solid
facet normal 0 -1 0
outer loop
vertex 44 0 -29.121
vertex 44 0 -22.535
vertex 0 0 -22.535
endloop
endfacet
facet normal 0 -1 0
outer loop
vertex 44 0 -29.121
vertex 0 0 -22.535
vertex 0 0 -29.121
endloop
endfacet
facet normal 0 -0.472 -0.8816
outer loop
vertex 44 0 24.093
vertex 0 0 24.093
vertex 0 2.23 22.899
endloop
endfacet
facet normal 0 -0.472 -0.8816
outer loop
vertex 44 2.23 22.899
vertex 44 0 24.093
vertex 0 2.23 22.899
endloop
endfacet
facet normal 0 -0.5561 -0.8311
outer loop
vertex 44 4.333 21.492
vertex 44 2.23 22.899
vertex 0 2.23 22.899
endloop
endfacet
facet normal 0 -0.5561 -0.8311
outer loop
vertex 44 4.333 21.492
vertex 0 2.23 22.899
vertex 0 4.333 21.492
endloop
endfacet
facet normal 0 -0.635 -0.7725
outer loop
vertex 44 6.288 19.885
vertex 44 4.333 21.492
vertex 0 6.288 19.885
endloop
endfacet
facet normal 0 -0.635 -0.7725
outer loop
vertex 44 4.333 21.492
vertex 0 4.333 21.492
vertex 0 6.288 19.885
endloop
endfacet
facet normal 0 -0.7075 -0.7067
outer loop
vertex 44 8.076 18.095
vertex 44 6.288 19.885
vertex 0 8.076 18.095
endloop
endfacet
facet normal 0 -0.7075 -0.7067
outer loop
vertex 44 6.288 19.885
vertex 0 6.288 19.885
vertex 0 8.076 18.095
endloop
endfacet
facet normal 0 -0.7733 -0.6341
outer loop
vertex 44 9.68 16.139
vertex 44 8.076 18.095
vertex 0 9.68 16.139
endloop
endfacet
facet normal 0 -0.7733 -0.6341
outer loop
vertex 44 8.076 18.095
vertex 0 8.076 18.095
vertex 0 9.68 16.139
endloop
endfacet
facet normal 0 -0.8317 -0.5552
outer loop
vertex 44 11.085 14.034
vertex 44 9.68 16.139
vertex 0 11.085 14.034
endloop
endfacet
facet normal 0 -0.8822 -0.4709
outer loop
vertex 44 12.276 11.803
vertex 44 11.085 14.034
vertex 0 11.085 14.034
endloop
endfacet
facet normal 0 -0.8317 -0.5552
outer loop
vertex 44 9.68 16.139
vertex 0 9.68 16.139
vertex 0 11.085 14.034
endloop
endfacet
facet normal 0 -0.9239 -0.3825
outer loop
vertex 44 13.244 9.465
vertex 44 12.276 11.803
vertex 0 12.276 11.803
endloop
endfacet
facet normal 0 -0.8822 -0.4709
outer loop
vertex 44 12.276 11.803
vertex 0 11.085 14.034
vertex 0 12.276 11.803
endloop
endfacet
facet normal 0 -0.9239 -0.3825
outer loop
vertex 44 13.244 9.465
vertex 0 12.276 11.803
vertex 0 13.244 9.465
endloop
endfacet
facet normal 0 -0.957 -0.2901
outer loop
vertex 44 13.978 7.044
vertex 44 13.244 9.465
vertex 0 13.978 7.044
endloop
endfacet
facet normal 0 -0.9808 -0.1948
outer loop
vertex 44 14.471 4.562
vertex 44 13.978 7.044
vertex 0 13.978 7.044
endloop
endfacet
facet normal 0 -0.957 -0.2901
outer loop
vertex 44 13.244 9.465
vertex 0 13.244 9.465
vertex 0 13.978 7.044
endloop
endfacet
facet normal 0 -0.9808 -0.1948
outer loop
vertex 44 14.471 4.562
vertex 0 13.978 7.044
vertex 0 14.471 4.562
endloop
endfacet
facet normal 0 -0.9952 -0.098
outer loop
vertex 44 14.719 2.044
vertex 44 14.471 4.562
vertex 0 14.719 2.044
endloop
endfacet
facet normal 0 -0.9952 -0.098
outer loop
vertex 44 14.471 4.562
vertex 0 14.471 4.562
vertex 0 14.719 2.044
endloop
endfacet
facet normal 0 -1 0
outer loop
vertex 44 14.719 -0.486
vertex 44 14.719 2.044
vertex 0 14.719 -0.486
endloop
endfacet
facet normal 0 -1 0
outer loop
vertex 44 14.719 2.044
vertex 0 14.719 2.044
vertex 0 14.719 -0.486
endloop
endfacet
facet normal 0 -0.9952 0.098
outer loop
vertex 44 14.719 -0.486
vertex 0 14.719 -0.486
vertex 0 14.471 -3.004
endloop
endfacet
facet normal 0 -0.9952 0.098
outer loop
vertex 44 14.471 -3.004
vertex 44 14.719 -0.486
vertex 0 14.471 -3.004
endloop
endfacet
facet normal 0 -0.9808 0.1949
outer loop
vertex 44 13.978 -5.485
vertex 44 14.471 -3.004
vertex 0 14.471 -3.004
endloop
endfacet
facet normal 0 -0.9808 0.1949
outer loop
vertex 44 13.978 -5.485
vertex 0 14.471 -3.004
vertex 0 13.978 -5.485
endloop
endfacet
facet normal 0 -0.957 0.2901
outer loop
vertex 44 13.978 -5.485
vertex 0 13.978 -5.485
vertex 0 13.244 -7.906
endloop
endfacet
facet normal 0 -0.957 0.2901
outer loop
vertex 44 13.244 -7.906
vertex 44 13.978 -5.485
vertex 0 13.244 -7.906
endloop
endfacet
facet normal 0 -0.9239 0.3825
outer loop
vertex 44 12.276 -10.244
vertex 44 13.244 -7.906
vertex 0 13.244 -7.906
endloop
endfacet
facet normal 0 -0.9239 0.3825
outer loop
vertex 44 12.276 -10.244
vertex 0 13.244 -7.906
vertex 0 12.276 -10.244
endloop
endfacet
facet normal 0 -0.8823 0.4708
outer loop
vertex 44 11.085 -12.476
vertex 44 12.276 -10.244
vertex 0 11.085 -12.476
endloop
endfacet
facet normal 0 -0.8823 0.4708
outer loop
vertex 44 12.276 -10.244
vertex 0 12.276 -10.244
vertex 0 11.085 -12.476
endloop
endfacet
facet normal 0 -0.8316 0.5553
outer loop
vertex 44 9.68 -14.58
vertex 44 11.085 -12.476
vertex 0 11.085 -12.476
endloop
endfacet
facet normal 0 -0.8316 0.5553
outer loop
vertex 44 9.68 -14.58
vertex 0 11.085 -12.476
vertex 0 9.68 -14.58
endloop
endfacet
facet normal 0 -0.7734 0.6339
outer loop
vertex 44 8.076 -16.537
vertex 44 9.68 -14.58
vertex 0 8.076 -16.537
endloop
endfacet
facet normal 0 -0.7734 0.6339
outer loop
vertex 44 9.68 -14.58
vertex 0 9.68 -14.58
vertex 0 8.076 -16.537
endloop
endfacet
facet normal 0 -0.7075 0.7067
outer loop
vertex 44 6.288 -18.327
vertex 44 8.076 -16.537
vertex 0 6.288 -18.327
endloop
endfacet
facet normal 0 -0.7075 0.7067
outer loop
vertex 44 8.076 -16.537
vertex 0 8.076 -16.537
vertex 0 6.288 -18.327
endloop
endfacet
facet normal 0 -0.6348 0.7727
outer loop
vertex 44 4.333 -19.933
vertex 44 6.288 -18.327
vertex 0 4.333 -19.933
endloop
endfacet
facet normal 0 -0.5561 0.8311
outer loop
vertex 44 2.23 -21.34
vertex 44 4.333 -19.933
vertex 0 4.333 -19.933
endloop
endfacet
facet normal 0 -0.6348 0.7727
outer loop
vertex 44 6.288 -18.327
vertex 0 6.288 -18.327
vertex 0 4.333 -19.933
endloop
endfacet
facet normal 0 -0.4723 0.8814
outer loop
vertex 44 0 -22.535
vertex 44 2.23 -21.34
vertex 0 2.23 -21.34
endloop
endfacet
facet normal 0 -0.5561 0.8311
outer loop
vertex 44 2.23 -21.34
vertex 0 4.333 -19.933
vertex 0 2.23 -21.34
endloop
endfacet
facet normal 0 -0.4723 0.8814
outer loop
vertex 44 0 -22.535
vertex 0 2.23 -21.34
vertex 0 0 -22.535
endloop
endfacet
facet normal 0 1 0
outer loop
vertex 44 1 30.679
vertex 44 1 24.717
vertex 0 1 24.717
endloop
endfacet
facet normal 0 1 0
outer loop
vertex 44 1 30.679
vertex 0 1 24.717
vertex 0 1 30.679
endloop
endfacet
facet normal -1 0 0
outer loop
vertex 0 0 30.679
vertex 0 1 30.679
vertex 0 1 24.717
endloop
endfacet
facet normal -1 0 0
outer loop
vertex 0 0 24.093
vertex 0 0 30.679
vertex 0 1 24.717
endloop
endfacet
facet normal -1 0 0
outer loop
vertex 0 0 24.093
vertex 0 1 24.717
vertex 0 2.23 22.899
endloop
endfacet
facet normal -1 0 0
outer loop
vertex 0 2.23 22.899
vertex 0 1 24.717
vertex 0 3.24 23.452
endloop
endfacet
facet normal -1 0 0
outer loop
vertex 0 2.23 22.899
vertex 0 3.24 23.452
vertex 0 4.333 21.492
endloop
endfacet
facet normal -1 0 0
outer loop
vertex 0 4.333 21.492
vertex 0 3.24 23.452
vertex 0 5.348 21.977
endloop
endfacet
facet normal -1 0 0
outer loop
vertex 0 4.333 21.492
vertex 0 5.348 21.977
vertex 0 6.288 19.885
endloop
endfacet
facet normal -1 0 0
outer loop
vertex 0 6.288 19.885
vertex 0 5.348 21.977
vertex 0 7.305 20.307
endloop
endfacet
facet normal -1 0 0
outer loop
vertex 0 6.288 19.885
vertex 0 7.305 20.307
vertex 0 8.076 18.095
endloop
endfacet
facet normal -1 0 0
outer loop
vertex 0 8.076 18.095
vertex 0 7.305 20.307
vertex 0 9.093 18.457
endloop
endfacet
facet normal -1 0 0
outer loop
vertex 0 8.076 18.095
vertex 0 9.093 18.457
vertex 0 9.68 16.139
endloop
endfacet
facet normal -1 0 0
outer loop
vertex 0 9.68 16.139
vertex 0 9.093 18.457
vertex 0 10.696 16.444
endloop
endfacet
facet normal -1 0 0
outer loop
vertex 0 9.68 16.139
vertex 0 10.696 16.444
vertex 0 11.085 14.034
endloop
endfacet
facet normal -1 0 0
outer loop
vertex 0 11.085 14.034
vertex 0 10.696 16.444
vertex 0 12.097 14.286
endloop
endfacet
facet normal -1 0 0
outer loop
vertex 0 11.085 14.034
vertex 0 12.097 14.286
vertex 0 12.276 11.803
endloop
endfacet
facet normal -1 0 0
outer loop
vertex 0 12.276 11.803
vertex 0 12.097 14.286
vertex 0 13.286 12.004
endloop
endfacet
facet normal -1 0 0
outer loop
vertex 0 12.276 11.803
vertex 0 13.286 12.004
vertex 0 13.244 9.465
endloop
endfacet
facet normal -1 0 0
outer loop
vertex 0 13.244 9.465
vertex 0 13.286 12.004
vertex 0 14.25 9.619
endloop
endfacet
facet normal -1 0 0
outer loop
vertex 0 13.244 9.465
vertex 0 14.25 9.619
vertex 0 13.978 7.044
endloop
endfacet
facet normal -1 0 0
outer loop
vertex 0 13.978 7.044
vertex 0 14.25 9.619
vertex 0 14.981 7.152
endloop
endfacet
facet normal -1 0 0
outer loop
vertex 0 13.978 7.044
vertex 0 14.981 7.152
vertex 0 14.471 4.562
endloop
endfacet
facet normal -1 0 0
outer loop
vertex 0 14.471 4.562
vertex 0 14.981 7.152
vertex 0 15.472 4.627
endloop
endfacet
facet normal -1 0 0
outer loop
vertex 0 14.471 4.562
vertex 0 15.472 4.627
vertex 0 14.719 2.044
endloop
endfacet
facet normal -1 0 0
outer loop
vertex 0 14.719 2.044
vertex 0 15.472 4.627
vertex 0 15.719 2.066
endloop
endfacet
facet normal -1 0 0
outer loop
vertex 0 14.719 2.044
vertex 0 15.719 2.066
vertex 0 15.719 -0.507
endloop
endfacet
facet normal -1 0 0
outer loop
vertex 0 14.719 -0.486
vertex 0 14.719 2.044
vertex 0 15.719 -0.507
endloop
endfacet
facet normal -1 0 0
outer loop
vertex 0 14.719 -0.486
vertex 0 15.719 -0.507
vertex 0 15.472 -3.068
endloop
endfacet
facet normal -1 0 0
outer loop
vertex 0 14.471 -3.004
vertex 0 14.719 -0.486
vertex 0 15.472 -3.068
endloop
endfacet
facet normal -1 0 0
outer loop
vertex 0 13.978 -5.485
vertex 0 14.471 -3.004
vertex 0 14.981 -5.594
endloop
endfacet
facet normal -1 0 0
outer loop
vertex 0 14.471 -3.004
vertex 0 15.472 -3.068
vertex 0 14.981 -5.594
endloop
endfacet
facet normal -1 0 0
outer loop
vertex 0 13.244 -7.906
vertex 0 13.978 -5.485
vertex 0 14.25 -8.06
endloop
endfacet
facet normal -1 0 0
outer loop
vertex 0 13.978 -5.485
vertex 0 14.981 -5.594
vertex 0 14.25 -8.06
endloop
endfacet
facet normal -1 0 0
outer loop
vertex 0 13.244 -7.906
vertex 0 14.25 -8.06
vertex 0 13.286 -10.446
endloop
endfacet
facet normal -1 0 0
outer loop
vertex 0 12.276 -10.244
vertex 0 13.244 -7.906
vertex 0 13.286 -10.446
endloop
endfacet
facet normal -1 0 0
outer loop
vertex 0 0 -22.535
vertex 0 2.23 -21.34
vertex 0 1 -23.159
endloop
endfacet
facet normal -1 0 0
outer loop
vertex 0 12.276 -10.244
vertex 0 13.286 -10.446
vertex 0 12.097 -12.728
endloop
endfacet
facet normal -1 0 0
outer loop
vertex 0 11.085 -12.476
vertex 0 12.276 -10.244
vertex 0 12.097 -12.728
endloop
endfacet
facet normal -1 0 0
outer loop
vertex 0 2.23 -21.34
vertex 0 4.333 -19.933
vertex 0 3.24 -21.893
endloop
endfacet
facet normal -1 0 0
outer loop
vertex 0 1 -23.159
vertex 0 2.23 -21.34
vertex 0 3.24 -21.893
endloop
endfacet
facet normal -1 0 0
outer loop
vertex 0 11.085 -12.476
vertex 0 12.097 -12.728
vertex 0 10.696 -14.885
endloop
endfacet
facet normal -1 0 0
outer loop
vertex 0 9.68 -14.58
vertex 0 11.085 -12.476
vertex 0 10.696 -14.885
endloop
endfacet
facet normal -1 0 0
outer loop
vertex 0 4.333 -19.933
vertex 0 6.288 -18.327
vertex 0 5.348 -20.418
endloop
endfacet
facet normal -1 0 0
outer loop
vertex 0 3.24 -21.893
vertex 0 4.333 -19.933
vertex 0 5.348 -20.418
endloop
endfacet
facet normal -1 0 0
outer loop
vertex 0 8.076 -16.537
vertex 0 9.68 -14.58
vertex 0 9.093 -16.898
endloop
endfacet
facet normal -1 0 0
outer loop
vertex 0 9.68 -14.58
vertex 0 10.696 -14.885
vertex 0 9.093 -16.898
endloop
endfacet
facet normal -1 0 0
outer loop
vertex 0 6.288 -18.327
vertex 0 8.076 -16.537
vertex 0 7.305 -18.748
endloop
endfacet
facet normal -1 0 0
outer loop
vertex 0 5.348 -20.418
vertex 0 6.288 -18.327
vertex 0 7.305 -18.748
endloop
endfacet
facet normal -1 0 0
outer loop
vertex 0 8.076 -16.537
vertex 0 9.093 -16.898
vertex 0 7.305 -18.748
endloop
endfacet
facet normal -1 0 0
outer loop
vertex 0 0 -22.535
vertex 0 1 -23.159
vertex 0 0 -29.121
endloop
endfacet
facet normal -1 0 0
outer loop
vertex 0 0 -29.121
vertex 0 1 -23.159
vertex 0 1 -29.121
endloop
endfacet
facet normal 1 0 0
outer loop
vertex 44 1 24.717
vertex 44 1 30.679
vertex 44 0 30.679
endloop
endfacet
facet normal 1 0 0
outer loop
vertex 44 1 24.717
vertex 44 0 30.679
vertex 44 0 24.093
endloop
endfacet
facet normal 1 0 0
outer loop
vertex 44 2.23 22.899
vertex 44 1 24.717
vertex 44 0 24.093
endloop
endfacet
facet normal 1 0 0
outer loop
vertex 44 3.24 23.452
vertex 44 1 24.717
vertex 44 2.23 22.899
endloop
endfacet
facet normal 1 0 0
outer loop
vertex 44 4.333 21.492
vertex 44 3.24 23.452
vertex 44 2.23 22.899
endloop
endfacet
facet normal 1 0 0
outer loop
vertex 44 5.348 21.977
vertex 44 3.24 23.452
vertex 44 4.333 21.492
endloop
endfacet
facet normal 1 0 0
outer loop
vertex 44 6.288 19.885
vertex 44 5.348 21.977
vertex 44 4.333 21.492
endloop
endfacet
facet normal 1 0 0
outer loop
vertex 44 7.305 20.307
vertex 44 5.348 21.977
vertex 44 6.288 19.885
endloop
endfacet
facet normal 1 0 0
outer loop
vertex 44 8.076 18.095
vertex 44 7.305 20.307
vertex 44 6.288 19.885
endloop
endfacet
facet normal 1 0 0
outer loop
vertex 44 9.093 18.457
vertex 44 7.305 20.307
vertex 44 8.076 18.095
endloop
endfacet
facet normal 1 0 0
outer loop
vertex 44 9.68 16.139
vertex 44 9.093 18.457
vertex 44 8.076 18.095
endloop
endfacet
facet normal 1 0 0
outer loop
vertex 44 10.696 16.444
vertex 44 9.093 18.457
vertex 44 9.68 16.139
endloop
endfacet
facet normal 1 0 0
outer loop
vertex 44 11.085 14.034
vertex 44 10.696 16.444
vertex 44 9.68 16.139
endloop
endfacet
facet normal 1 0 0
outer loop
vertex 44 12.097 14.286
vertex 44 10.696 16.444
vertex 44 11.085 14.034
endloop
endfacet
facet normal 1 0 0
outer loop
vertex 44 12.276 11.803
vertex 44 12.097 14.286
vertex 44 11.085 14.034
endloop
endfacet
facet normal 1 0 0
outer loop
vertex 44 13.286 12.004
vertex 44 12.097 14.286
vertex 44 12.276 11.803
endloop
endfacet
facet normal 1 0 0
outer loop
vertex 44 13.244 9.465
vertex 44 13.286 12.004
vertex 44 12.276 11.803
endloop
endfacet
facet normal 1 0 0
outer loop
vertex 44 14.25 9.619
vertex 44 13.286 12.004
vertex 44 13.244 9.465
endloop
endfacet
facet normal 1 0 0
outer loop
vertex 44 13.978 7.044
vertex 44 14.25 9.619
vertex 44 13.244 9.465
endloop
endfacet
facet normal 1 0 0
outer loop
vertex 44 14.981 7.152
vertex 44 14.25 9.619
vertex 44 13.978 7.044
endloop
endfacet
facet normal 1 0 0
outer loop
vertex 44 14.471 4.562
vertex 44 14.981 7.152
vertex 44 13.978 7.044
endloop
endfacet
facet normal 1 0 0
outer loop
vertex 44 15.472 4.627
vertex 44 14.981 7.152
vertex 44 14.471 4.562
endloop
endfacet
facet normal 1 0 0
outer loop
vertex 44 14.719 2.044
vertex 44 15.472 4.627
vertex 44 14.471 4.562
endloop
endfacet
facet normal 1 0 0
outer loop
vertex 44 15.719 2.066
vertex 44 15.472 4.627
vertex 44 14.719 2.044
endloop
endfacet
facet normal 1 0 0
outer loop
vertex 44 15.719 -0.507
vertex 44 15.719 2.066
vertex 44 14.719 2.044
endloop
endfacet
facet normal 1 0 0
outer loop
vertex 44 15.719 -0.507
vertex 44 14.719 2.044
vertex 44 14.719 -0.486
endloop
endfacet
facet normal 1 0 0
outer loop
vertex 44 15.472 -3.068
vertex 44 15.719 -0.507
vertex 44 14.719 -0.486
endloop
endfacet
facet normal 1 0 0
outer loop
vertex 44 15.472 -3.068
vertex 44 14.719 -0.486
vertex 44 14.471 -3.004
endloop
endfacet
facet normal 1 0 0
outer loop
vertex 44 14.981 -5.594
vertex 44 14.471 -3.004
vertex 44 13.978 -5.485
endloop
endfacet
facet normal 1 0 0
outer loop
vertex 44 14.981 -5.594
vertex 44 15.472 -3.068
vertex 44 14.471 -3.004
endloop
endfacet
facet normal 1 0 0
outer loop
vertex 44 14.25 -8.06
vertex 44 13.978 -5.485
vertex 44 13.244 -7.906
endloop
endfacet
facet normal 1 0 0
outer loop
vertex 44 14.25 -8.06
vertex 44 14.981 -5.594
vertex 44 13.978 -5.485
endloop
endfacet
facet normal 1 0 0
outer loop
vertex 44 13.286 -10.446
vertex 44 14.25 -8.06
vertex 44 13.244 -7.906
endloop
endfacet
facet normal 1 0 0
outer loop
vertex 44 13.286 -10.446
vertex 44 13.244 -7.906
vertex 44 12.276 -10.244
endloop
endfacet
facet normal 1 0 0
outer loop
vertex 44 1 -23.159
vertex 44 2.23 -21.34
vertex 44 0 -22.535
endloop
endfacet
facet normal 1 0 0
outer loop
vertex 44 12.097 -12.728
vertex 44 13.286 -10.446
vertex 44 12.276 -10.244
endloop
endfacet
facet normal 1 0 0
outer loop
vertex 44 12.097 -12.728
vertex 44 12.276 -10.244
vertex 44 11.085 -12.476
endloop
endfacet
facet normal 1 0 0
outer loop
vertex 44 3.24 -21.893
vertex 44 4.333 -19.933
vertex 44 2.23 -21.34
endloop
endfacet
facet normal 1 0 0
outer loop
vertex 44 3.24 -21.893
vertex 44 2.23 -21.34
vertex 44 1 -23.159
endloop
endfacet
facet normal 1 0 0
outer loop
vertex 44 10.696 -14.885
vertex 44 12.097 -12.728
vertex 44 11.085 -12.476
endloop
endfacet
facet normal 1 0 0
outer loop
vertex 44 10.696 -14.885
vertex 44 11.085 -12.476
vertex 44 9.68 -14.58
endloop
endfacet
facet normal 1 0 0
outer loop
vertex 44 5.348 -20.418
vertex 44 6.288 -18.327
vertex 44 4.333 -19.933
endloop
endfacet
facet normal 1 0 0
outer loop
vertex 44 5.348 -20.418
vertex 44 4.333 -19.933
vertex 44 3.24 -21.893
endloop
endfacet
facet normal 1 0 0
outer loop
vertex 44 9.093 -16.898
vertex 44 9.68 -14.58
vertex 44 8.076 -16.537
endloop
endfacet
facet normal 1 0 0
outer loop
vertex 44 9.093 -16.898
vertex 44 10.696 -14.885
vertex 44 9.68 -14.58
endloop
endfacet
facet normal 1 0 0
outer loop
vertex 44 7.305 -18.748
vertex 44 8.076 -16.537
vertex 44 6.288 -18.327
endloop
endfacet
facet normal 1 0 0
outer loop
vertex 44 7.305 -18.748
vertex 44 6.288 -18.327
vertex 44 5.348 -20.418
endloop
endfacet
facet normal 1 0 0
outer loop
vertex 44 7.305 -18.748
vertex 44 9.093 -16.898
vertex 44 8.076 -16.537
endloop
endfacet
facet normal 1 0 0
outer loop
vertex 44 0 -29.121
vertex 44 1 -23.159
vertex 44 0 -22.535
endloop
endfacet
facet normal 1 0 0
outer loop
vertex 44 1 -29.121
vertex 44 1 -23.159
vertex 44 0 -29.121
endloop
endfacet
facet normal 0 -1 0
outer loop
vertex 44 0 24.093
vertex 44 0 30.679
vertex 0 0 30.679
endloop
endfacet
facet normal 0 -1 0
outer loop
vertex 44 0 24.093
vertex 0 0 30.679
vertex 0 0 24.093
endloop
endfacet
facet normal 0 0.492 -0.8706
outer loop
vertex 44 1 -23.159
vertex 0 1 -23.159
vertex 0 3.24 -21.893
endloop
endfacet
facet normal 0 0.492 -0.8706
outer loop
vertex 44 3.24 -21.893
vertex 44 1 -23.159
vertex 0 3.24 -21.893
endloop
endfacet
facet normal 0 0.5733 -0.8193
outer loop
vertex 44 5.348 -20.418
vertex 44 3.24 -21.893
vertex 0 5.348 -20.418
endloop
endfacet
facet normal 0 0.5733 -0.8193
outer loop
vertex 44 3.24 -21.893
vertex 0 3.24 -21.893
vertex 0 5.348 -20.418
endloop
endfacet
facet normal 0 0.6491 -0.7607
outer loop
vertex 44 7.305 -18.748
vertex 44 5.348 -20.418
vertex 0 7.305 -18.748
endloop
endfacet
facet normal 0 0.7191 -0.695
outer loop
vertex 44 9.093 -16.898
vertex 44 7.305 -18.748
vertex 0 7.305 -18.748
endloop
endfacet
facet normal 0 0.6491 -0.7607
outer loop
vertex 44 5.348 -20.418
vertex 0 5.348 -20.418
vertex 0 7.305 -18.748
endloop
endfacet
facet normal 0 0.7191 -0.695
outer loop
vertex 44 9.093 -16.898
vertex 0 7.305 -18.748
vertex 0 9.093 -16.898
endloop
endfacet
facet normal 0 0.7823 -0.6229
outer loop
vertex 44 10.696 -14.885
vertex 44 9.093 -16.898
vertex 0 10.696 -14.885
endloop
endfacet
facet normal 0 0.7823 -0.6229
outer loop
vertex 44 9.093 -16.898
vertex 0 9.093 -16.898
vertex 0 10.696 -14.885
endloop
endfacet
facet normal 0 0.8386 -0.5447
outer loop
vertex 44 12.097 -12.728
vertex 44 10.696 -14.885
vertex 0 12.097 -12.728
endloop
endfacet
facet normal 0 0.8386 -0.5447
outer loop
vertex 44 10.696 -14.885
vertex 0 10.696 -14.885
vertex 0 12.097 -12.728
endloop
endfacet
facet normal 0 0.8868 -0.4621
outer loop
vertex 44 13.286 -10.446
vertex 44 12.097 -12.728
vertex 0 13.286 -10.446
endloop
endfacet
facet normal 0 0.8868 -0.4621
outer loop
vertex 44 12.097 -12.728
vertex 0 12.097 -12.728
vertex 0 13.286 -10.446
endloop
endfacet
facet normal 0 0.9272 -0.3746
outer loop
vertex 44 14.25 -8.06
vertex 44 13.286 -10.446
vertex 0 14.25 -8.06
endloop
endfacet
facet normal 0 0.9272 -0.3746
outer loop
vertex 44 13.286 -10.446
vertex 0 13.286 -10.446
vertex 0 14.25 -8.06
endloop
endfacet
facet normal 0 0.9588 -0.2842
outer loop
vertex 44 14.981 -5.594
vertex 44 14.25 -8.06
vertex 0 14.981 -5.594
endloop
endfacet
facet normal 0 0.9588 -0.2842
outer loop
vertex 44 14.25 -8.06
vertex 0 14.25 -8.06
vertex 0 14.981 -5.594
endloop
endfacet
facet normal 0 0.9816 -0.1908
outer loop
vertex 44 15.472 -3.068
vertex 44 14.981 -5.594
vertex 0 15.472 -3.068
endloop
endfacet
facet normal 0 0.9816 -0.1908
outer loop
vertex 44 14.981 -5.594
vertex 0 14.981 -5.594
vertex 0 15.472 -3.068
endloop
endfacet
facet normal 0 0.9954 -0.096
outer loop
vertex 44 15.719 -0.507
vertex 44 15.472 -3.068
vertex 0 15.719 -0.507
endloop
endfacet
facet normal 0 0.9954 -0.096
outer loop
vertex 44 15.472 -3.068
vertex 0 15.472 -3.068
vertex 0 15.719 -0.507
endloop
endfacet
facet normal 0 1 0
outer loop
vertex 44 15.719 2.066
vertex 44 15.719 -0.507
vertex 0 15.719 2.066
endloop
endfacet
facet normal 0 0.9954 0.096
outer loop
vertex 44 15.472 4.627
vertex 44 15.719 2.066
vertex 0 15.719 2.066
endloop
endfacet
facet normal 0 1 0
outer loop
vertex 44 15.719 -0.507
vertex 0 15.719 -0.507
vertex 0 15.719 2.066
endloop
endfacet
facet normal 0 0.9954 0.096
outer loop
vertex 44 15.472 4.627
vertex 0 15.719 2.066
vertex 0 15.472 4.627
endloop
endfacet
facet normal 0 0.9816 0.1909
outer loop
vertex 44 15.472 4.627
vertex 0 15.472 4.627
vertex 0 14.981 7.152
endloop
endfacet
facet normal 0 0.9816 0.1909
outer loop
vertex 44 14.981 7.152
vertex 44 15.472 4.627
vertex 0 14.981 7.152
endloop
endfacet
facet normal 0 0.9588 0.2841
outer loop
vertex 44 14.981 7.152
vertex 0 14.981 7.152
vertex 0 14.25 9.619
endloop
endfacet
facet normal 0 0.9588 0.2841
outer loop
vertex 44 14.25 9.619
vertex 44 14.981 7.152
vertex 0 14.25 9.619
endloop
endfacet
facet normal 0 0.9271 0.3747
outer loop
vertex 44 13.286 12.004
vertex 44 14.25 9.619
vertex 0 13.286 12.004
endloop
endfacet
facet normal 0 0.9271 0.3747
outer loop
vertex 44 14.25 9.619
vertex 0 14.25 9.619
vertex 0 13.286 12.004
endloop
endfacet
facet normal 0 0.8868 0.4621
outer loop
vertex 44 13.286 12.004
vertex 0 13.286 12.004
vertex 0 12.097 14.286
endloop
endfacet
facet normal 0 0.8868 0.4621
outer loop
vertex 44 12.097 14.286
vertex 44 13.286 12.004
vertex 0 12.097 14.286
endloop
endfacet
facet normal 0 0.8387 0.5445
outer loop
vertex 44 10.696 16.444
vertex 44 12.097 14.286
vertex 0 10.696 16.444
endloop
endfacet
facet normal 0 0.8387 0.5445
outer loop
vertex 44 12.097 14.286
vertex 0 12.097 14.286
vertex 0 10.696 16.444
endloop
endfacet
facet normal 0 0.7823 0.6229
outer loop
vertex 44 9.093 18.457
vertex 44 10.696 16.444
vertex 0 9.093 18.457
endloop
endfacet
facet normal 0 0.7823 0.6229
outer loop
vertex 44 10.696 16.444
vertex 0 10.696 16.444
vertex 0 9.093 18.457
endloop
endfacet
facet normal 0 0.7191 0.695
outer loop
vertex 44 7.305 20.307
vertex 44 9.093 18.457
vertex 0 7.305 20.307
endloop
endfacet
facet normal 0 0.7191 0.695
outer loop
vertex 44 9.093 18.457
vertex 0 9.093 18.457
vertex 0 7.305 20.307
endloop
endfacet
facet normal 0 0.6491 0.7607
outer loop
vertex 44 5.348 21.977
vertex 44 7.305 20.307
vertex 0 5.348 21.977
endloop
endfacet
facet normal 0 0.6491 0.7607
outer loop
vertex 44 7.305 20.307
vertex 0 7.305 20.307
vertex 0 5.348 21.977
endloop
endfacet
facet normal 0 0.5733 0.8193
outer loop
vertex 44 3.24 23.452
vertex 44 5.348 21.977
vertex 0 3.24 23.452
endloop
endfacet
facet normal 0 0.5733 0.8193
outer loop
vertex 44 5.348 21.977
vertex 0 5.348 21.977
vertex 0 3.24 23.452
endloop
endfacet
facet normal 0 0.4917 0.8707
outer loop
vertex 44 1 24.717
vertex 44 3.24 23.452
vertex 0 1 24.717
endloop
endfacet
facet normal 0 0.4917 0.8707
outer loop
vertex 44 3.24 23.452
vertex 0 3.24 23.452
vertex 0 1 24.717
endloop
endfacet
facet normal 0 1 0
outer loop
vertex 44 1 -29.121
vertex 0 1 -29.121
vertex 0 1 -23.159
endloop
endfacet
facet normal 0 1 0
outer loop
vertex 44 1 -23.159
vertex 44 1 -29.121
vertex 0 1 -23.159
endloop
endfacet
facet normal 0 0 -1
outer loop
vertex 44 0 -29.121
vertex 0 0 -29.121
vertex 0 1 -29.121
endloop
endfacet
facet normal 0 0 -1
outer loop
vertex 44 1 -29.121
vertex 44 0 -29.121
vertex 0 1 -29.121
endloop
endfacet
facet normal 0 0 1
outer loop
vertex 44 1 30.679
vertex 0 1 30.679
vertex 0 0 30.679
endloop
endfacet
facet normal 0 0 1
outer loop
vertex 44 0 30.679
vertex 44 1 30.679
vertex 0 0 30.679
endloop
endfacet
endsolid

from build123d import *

# Parameters (mm, degrees)
BOSS_EXTRUDE1_DEPTH = 44


with BuildPart() as part:
    # Sketch1 → Boss-Extrude1 (new body)
    with BuildSketch(Plane(origin=(0, 0, 0), x_dir=(0, 0, -1), z_dir=(1, 0, 0))):
        with BuildLine():
            ThreePointArc((-24.093171188, 0), (-0.779280479, 14.75), (22.534610231, 0))
            Line((22.534610231, 0), (29.120719521, 0))
            Line((29.120719521, 0), (29.120719521, 1))
            Line((29.120719521, 1), (23.158921208, 1))
            ThreePointArc((23.158921208, 1), (-0.779280479, 15.75), (-24.717482165, 1))
            Line((-24.717482165, 1), (-30.679280479, 1))
            Line((-30.679280479, 1), (-30.679280479, 0))
            Line((-30.679280479, 0), (-24.093171188, 0))
        make_face()
    extrude(amount=BOSS_EXTRUDE1_DEPTH)


solid = part.part
